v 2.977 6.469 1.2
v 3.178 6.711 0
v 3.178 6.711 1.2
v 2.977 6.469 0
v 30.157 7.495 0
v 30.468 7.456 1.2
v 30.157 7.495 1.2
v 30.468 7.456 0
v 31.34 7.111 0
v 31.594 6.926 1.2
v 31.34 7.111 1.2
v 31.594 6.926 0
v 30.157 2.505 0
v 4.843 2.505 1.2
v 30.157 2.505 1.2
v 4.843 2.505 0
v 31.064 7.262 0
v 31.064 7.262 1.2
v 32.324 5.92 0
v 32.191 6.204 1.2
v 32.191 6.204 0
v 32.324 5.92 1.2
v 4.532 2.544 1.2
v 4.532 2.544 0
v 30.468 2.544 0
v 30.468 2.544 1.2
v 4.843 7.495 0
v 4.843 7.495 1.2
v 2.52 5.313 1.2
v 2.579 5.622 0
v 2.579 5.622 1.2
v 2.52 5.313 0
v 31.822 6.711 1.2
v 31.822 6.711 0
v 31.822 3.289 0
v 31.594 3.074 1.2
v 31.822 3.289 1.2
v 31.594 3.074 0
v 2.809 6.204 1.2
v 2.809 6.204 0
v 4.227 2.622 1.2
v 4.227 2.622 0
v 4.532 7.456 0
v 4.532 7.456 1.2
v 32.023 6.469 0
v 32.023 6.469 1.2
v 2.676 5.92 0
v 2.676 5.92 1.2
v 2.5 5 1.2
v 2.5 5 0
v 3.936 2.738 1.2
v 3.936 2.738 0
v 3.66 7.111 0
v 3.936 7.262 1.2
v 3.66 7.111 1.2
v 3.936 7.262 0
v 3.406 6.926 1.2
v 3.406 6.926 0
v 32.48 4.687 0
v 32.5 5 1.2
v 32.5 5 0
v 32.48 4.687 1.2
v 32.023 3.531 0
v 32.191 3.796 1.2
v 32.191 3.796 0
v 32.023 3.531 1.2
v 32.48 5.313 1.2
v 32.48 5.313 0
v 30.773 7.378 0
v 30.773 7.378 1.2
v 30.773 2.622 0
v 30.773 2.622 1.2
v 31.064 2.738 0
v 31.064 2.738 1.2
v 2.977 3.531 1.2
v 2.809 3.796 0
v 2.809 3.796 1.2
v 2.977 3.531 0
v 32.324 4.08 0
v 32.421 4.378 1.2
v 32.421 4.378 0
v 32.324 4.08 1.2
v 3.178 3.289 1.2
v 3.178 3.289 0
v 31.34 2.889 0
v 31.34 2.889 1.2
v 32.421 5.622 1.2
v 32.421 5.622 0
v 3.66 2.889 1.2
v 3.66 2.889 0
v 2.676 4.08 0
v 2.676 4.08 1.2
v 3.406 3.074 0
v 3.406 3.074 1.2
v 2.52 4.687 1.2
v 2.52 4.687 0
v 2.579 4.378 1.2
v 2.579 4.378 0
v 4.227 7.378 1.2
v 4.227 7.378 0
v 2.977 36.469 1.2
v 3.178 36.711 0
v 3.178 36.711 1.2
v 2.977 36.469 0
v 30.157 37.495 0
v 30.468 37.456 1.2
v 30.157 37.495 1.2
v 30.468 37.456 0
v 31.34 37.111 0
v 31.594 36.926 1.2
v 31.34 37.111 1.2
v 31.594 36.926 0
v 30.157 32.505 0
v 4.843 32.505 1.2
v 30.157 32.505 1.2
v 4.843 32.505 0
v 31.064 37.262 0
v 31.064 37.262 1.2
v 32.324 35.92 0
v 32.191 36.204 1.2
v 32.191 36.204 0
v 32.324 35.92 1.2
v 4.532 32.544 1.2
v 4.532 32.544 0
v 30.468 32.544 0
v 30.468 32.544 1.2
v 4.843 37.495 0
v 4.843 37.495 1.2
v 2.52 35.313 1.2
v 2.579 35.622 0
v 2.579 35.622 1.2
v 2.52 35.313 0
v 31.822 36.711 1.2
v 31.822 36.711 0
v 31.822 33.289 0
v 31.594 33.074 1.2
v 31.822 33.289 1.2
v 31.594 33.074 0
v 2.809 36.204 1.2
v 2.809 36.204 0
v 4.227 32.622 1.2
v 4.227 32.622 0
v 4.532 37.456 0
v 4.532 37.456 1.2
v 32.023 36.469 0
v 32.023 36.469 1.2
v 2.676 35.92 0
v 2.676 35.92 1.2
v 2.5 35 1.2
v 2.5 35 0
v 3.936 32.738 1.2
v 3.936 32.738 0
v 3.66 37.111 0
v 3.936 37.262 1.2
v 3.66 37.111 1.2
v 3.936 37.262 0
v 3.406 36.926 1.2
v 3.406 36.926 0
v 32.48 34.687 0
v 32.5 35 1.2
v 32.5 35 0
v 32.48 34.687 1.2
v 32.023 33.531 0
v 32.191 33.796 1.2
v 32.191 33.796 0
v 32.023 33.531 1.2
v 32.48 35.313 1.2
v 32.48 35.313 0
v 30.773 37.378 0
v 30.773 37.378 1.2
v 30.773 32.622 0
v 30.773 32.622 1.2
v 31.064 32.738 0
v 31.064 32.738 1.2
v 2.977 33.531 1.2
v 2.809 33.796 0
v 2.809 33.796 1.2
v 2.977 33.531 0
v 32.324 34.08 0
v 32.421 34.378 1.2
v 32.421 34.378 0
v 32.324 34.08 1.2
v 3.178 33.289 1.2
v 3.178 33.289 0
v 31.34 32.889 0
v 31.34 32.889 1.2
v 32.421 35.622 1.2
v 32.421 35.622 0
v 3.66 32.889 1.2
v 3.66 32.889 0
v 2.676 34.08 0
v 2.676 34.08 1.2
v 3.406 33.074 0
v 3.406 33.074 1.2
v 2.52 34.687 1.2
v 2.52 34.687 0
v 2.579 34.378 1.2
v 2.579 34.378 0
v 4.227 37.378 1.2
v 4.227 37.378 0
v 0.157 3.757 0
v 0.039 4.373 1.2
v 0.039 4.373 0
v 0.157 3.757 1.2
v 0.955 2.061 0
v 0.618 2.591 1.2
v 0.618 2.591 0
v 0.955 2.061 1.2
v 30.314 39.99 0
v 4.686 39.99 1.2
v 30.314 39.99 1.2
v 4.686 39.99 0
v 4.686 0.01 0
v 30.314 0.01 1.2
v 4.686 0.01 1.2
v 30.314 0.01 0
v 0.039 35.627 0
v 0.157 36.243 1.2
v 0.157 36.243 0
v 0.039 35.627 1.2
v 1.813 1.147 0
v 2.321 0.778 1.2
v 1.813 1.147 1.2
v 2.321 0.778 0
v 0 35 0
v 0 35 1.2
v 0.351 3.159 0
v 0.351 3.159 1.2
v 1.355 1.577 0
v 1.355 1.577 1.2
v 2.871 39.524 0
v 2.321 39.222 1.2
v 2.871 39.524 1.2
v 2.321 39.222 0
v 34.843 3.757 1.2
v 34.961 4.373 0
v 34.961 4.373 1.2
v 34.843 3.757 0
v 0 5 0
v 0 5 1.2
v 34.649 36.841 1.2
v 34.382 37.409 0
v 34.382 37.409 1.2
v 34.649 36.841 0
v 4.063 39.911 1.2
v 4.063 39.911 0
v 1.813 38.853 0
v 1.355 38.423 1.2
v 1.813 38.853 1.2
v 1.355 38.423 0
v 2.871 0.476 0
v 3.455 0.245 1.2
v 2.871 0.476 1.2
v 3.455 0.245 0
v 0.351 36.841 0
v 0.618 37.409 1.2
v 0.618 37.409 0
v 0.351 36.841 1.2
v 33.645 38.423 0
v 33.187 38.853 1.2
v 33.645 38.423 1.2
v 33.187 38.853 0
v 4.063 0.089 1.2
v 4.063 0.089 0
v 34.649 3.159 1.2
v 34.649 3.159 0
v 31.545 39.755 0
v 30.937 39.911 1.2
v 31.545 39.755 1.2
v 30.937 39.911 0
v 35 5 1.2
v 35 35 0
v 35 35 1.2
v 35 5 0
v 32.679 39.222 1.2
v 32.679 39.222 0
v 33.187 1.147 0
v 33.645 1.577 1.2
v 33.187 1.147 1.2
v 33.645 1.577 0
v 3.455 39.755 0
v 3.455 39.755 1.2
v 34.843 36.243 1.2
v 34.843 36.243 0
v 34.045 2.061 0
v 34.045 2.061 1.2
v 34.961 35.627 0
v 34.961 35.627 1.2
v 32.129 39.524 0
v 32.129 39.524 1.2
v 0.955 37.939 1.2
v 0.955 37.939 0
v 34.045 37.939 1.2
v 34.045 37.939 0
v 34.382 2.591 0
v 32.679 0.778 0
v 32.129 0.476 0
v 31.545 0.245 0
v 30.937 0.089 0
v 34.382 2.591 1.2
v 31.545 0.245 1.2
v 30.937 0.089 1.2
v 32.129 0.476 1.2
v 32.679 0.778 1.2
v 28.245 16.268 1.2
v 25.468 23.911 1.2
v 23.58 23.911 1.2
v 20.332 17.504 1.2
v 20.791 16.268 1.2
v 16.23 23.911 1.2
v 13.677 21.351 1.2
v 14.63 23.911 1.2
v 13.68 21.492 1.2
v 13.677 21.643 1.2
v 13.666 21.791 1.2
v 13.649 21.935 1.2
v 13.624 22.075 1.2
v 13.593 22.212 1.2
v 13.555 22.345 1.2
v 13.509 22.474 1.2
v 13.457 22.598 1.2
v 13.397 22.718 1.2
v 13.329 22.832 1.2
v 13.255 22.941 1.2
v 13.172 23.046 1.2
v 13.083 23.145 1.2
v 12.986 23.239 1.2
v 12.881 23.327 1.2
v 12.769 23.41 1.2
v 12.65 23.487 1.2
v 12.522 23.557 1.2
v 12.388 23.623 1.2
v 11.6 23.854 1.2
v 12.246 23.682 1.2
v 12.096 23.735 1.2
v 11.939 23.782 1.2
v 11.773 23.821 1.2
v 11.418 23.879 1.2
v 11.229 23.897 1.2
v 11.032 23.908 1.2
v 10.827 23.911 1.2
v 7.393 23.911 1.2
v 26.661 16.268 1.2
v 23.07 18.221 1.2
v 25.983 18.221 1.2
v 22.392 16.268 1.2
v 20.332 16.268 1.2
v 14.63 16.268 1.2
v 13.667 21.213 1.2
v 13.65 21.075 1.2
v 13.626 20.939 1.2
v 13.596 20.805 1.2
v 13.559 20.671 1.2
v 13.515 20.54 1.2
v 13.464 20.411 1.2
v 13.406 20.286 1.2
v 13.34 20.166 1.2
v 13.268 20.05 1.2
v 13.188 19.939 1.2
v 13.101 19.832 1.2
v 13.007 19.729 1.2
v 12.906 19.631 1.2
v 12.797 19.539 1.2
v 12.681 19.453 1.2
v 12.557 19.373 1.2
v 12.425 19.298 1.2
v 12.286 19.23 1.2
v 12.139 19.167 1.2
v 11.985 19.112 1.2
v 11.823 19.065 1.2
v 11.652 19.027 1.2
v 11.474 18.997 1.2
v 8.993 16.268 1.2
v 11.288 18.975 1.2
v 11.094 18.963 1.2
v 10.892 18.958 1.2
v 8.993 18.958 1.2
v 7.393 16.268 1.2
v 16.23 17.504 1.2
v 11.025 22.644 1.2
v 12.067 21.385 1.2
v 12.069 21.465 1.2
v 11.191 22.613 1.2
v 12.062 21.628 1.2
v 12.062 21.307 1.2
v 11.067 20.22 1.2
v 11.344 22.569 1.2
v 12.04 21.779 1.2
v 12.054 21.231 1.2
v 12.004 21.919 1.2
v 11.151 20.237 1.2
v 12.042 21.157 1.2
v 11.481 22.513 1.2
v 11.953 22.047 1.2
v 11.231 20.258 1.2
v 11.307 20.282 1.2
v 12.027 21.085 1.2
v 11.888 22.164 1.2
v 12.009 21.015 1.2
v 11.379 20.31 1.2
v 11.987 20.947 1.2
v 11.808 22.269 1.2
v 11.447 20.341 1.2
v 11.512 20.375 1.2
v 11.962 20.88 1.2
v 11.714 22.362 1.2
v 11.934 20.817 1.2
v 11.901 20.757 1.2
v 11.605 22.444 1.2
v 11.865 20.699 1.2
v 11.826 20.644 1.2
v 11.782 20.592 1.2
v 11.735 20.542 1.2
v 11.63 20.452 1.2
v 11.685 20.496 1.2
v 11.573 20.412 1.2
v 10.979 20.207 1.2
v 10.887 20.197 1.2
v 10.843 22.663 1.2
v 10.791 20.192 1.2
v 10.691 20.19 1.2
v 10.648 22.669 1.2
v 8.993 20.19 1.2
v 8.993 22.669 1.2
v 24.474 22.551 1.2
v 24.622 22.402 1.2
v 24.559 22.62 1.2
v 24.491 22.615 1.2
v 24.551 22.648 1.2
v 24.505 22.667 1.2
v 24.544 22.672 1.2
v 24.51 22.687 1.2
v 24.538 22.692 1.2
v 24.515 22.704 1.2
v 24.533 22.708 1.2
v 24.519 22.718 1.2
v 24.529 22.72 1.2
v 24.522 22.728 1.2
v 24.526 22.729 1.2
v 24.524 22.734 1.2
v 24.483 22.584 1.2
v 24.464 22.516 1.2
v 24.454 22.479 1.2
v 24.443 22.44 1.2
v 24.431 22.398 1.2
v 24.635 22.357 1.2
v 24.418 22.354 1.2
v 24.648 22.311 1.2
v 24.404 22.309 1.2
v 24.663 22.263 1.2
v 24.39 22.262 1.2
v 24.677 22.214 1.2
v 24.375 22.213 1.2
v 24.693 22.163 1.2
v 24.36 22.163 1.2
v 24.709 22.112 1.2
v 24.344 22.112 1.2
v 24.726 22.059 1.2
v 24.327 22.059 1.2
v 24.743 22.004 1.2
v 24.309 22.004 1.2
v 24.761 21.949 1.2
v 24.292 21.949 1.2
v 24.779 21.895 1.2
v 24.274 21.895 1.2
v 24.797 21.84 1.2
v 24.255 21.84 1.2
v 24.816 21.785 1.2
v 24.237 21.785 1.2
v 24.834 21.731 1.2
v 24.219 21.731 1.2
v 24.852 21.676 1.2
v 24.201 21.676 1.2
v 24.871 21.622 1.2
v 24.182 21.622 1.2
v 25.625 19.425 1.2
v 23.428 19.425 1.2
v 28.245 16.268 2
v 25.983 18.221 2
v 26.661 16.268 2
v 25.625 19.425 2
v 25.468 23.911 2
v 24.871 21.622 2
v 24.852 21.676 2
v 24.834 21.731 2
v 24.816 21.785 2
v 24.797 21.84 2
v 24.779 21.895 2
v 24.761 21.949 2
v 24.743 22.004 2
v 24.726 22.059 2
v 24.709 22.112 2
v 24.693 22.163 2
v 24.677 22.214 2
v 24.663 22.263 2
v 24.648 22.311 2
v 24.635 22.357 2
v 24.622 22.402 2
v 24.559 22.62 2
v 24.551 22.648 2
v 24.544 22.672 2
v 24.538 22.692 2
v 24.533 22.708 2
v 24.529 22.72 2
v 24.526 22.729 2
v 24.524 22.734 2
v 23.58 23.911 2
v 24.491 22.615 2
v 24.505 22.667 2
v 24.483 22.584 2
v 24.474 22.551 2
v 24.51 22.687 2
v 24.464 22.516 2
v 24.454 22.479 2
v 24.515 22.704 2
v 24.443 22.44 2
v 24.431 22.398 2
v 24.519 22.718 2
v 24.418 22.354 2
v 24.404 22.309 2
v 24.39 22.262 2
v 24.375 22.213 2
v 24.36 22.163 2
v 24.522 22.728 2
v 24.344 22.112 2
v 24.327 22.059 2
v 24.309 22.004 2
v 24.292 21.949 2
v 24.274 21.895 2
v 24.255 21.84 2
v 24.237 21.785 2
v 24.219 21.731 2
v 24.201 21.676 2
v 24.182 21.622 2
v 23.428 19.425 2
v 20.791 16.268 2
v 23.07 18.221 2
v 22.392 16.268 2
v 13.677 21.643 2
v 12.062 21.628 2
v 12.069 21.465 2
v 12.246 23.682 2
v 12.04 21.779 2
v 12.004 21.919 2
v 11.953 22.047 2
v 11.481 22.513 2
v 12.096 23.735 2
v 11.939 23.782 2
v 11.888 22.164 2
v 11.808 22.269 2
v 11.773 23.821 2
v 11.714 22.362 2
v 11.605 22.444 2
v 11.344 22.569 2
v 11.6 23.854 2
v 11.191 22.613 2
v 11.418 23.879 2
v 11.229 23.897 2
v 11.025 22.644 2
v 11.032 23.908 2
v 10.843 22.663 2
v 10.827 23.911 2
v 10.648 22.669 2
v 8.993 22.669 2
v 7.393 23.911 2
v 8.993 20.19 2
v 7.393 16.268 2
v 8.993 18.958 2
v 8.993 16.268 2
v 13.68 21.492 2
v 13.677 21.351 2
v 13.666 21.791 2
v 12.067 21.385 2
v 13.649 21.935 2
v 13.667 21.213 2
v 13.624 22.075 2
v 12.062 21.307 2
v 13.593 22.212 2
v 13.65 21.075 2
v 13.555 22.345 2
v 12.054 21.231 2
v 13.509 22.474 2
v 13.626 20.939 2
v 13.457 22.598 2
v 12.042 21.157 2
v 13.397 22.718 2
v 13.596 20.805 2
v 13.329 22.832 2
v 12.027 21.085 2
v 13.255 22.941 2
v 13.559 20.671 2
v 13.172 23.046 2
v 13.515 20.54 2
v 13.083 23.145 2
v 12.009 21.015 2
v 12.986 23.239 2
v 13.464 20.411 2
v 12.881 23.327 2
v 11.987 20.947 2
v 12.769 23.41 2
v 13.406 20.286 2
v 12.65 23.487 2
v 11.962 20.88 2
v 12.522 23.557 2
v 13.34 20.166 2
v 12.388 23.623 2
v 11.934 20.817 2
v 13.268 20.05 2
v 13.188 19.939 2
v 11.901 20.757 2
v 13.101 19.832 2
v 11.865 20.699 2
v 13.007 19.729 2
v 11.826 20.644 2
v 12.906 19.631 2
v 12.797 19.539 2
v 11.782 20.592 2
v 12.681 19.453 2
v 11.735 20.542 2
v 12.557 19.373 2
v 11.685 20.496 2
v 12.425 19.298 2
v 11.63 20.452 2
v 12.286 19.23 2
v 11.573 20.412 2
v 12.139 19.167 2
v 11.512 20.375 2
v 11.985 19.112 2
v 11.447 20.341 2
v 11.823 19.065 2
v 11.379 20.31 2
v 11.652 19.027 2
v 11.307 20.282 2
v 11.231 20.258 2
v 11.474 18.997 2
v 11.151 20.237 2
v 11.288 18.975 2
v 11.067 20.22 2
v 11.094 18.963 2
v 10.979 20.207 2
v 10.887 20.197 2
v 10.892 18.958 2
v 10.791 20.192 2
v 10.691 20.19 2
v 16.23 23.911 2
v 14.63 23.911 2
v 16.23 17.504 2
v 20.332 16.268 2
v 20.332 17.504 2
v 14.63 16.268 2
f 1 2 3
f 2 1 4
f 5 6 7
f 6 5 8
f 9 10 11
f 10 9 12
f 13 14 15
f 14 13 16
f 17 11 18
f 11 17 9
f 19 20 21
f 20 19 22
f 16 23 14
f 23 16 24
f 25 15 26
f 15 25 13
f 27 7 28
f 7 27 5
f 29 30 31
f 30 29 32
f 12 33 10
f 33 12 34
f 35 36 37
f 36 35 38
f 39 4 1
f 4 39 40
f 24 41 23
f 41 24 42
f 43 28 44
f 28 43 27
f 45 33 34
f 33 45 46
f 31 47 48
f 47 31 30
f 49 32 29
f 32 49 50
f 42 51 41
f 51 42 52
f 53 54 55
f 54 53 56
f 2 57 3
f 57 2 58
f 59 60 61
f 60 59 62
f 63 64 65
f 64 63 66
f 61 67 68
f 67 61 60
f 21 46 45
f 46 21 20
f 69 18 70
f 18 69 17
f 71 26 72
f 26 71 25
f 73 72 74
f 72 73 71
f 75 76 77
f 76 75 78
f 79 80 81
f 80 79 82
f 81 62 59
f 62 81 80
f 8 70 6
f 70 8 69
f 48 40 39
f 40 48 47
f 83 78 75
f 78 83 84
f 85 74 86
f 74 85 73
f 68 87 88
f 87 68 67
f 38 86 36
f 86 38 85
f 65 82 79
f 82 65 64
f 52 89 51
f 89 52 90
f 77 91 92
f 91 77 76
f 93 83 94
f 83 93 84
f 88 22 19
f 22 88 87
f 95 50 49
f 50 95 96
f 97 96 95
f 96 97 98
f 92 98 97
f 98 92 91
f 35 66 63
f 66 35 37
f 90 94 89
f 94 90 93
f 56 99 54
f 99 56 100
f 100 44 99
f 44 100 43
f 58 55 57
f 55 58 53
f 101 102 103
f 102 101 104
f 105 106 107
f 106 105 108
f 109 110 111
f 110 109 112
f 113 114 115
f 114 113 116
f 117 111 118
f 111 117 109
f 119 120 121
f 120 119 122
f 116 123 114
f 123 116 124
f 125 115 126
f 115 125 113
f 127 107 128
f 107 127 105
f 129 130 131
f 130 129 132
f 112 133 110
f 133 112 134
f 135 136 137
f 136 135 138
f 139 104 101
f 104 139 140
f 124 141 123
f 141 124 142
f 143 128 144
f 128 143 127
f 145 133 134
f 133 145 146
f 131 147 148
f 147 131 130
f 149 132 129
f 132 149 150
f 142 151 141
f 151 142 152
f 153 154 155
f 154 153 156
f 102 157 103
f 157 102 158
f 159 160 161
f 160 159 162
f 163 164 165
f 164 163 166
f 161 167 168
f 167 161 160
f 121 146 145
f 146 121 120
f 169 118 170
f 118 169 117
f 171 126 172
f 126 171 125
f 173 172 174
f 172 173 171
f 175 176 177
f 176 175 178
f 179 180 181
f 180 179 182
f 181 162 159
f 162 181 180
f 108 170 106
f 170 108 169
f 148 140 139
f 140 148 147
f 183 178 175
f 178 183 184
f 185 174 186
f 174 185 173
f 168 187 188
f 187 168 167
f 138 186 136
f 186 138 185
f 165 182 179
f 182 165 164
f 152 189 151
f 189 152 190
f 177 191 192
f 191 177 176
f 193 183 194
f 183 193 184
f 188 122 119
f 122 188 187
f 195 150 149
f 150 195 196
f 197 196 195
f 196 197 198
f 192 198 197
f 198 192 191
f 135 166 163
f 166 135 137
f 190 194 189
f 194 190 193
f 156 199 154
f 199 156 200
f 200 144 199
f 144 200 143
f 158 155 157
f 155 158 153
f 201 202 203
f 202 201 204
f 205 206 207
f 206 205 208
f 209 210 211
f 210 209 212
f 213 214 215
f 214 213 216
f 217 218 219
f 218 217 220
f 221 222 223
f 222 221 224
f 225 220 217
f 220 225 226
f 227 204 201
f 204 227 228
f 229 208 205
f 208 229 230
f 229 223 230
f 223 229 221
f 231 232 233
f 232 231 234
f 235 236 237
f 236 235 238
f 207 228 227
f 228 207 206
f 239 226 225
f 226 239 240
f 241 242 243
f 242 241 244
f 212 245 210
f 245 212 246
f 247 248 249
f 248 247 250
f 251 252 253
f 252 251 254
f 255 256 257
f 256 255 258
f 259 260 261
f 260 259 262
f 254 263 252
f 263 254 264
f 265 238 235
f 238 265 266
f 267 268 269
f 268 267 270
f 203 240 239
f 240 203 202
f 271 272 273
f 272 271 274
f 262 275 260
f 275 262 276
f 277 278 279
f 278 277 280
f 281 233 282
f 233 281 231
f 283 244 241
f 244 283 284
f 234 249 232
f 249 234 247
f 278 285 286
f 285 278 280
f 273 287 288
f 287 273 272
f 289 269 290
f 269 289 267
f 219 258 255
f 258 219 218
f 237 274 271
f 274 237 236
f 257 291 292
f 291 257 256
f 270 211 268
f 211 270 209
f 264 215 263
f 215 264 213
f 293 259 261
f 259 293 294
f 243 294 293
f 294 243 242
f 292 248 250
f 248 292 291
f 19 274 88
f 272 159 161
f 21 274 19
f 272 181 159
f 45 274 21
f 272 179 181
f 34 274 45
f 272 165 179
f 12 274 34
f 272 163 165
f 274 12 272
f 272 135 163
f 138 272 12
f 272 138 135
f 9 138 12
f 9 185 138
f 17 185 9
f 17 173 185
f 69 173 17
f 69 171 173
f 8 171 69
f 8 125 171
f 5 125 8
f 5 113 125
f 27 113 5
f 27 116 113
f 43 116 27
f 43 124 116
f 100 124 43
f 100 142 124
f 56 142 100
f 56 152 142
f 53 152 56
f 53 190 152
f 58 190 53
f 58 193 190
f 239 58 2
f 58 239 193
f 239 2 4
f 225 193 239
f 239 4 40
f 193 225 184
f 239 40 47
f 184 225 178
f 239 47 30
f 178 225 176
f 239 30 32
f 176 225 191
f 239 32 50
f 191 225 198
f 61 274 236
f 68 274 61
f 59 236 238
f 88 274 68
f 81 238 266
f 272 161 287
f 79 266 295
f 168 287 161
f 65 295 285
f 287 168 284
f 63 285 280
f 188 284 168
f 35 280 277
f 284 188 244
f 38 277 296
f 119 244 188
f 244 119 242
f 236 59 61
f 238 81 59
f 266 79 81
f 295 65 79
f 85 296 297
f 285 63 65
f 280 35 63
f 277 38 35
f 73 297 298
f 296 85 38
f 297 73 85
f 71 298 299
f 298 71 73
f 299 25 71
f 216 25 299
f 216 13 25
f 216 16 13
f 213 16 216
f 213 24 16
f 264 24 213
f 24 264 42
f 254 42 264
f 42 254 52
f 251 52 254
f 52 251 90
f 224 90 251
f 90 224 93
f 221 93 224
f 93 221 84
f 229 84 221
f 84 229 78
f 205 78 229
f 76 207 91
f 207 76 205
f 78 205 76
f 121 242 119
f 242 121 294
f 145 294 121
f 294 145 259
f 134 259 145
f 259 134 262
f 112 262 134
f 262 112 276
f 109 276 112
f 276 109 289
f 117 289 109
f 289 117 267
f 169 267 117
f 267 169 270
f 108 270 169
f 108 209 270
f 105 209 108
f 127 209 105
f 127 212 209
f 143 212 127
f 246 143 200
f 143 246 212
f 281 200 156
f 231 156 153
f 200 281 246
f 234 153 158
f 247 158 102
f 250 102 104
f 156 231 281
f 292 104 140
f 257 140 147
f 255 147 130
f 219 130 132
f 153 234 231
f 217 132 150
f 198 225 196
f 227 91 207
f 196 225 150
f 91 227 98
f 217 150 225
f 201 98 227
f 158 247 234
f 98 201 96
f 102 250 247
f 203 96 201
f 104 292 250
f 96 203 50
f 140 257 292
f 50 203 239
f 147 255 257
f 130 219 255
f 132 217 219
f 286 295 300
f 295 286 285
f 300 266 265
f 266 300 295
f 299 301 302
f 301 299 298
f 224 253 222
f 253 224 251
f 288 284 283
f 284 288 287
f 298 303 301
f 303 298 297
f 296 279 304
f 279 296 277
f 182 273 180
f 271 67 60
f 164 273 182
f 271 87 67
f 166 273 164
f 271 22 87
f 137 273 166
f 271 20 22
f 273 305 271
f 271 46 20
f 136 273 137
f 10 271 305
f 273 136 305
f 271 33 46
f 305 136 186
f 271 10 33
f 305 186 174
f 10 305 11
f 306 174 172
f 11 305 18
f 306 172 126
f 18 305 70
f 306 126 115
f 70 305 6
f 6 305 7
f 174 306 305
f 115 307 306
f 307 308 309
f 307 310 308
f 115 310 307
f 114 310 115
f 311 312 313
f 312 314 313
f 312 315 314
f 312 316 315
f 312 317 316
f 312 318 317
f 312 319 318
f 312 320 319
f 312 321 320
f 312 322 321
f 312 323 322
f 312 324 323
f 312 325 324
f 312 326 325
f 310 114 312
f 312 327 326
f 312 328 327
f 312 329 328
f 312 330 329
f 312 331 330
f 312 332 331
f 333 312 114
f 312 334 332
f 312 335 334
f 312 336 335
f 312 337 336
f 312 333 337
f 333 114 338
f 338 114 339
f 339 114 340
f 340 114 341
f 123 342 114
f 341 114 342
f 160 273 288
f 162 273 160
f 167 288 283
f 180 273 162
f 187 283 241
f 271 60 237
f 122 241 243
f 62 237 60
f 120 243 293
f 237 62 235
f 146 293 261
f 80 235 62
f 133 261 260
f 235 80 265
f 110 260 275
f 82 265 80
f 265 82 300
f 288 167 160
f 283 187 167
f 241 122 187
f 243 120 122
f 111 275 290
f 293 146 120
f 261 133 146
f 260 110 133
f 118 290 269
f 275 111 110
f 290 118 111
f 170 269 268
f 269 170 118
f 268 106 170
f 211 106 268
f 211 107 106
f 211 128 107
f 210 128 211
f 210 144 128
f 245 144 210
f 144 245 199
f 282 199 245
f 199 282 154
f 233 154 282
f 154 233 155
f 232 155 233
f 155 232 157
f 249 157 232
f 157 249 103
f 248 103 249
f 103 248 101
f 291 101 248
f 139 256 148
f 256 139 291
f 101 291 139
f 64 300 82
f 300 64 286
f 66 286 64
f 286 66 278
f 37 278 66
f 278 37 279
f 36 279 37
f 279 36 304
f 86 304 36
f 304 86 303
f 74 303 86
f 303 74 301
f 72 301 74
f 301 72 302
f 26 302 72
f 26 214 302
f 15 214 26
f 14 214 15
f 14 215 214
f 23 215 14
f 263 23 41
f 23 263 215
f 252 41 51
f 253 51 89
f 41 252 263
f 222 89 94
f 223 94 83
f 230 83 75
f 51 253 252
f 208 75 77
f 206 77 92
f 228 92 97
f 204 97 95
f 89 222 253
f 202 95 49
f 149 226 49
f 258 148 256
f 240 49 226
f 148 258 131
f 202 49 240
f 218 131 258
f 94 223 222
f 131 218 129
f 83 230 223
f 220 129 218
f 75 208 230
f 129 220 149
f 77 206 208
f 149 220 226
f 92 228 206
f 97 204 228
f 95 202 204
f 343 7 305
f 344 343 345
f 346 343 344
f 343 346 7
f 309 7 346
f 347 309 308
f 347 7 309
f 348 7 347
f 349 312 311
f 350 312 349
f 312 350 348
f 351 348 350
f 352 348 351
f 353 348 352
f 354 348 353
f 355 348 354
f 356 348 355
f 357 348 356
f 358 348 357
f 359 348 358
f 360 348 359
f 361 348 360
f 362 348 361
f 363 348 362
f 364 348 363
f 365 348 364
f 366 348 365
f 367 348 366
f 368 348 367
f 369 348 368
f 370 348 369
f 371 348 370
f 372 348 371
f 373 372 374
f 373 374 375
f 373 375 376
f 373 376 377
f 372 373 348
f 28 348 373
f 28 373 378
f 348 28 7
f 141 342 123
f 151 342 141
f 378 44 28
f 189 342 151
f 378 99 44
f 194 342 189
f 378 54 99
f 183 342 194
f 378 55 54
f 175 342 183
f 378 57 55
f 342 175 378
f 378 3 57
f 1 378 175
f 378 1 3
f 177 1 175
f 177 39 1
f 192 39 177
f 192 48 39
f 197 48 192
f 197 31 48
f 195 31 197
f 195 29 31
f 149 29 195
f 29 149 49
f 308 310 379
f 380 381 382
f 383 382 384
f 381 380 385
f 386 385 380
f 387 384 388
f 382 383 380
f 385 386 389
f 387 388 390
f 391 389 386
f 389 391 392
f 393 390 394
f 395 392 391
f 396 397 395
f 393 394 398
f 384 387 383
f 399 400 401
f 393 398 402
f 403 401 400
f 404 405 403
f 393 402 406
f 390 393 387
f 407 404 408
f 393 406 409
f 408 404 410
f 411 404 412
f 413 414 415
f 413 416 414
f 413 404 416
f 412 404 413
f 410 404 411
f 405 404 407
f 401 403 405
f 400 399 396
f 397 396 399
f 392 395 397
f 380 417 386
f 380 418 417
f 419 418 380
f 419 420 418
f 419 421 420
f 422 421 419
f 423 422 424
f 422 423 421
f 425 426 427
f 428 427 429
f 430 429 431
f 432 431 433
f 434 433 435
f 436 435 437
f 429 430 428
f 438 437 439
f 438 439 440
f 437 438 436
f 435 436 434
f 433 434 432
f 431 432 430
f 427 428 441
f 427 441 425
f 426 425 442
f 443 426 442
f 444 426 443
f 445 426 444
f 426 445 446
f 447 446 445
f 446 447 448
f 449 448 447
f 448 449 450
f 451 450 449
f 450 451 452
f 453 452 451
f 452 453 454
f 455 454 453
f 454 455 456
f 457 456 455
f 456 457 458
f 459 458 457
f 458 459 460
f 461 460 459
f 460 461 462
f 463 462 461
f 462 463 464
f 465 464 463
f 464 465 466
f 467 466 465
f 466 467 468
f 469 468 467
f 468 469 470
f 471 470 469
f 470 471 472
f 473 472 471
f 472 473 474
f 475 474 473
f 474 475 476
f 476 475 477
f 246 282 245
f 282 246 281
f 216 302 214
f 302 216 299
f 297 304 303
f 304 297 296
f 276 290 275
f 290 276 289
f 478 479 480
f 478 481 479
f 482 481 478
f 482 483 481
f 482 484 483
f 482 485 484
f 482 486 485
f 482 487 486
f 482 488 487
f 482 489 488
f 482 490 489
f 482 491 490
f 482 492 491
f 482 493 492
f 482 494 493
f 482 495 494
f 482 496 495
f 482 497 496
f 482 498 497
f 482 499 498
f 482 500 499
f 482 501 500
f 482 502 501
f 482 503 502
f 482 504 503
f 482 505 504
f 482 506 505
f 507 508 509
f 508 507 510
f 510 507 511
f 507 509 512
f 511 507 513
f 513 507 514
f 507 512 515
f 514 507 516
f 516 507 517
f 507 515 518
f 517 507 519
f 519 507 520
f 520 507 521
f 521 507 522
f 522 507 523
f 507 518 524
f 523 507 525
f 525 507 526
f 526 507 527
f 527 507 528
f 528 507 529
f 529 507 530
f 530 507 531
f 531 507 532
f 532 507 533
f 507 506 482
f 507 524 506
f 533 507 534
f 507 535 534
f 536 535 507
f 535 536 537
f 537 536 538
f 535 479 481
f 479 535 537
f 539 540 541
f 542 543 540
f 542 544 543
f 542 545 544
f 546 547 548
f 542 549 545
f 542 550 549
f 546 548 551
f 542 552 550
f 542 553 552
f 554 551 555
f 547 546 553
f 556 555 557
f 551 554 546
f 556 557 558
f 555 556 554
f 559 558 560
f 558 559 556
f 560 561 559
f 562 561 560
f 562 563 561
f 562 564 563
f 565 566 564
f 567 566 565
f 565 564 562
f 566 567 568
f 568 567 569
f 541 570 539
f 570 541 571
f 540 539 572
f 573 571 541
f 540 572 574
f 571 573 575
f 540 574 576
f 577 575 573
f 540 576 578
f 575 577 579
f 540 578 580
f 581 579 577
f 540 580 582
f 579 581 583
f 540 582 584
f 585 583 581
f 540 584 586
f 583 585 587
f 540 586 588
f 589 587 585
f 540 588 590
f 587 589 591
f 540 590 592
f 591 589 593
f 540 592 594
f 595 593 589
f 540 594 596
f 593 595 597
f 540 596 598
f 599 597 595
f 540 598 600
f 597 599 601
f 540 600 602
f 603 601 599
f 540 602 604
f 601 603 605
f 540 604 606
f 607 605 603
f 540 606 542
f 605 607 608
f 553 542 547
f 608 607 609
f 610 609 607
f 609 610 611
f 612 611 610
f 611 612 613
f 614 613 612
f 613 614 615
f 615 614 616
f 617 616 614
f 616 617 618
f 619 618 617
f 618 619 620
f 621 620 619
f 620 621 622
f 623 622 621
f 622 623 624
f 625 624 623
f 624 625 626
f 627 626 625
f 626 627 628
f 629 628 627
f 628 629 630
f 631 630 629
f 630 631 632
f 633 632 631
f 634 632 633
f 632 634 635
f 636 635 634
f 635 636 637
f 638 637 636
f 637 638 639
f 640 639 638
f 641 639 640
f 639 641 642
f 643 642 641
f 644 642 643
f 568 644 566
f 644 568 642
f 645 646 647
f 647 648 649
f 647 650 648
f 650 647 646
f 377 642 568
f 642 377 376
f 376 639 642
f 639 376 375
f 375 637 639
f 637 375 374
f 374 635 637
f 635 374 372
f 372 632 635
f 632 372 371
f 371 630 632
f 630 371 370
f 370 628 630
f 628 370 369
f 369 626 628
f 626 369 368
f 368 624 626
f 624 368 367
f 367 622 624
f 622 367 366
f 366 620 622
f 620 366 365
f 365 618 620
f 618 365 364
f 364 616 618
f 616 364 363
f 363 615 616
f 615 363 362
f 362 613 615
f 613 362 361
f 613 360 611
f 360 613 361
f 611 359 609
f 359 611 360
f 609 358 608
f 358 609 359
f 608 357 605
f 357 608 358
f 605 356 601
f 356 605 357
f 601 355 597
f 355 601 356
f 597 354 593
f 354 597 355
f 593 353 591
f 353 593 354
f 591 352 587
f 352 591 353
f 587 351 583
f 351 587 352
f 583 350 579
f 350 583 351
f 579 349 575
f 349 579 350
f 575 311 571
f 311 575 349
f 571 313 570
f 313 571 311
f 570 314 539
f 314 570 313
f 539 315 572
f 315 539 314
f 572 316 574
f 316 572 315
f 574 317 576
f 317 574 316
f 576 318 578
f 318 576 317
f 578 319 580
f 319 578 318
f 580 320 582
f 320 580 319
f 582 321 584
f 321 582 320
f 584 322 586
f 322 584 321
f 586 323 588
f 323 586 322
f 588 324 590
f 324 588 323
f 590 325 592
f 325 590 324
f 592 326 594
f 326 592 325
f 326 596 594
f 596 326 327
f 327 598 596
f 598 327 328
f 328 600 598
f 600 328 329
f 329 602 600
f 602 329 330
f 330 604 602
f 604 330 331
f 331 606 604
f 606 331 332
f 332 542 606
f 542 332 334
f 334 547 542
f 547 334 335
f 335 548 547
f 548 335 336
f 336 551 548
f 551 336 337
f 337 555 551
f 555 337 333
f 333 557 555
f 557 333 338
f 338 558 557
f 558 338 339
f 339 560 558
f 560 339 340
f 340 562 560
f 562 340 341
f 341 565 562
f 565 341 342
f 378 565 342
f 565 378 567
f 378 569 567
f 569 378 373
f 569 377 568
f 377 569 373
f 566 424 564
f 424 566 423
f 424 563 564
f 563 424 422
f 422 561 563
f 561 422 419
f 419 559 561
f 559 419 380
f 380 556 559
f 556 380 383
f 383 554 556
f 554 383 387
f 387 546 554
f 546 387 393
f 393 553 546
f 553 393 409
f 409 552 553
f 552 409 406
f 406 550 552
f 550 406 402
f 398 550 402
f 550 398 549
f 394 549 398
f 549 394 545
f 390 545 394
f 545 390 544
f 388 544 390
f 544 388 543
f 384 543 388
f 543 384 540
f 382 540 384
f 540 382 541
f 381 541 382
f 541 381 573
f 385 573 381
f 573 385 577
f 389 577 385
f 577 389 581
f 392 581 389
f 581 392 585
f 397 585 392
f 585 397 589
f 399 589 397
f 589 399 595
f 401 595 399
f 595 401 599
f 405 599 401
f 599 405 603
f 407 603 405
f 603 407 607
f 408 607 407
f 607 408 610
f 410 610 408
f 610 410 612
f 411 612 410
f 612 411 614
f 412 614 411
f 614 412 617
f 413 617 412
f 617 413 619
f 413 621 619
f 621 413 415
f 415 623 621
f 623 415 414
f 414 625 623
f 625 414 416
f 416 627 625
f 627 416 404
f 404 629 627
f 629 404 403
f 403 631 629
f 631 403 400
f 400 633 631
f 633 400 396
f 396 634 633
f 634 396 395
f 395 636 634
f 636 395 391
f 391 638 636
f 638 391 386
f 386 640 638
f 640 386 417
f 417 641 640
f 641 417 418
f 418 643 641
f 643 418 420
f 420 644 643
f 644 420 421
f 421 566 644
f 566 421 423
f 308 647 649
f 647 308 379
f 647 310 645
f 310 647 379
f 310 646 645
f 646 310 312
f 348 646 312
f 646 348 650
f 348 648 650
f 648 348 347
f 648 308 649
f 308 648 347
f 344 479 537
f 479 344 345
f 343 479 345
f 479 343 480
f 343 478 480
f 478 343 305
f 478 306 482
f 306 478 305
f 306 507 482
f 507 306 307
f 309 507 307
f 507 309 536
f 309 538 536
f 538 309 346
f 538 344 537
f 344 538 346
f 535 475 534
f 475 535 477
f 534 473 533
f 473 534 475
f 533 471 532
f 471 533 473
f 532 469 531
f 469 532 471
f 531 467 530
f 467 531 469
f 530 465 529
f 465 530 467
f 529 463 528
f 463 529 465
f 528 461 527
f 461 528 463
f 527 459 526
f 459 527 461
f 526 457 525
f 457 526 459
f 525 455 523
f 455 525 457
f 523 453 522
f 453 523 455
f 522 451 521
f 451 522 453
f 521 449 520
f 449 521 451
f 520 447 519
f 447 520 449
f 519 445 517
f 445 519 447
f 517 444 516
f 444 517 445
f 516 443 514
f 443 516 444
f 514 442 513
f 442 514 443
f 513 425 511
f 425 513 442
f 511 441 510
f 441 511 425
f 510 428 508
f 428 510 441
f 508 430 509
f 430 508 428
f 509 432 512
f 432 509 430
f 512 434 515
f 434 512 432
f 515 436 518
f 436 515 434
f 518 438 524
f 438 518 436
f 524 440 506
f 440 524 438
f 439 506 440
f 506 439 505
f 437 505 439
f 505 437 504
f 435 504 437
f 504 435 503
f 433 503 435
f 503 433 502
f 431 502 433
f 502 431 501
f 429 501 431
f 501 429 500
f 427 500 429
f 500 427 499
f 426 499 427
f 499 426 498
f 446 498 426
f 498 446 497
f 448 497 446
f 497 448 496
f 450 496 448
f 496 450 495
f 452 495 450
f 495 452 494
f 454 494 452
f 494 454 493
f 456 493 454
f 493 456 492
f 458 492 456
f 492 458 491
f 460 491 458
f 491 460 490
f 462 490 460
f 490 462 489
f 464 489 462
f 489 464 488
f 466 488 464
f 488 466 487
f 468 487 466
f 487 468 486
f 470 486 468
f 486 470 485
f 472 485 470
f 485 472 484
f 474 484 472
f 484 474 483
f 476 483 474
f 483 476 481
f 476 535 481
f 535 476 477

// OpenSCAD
// Parameterizable Sheet Holder by Michael Gebis
// ivymike at gmail and twitter. I'd love to hear from you!

// To the extent possible under law, the author(s) have dedicated all
// copyright and related and neighboring rights to this software to the
// public domain worldwide. This software is distributed without any
// warranty. Use at your own risk!

// I ask but do not require that you credit me if you use or remix this. Thank you!
OUTER_DIA_MM    = 10;
INNER_DIA_MM    = 5;

LENGTH_MM       = 40;
WIDTH_MM        = 35;  // For up to 4-letter tags. For wider, try 50mm.
BODY_HEIGHT_MM  = 1.2; // Should be a multiple of your layer height
TEXT_HEIGHT_MM  = 0.8; // Should be a multiple of your layer height

TEXT            = "PLA";

$eps            = 0.0001;
$fn             = 50;

module ocyl() {
    cylinder(h = BODY_HEIGHT_MM, d = OUTER_DIA_MM);
}

module create_body() {
    hull() {
        translate([OUTER_DIA_MM/2,          OUTER_DIA_MM/2,             0]) { ocyl(); }
        translate([OUTER_DIA_MM/2,          LENGTH_MM-OUTER_DIA_MM/2,   0]) { ocyl(); }
        translate([WIDTH_MM-OUTER_DIA_MM/2, OUTER_DIA_MM/2,             0]) { ocyl(); }
        translate([WIDTH_MM-OUTER_DIA_MM/2, LENGTH_MM-OUTER_DIA_MM/2,   0]) { ocyl(); }
    }
}

module create_hole() {
    translate([0, 0, -.5*BODY_HEIGHT_MM]) {
        hull() {
            translate([OUTER_DIA_MM/2, OUTER_DIA_MM/2, 0]) { 
                cylinder( h = BODY_HEIGHT_MM*2, d = INNER_DIA_MM ); 
            }
            translate([WIDTH_MM-OUTER_DIA_MM/2, OUTER_DIA_MM/2,0]) {
                cylinder( h = BODY_HEIGHT_MM*2, d = INNER_DIA_MM ) ; 
            }
        }
    }
}


module create_filament_tag() {
    difference() {
        create_body();
        union() {
            create_hole();   
            translate([0, LENGTH_MM-OUTER_DIA_MM, 0]) { 
                create_hole(); 
            }
        }
    }

    translate([WIDTH_MM/2, LENGTH_MM/2, BODY_HEIGHT_MM-$eps]) {
        linear_extrude(TEXT_HEIGHT_MM) {
            // I find bold is more readable from a distance
            text(TEXT, size=8, halign="center", valign="center", font="Arial:style=Bold");
        }
    }
}

create_filament_tag();
